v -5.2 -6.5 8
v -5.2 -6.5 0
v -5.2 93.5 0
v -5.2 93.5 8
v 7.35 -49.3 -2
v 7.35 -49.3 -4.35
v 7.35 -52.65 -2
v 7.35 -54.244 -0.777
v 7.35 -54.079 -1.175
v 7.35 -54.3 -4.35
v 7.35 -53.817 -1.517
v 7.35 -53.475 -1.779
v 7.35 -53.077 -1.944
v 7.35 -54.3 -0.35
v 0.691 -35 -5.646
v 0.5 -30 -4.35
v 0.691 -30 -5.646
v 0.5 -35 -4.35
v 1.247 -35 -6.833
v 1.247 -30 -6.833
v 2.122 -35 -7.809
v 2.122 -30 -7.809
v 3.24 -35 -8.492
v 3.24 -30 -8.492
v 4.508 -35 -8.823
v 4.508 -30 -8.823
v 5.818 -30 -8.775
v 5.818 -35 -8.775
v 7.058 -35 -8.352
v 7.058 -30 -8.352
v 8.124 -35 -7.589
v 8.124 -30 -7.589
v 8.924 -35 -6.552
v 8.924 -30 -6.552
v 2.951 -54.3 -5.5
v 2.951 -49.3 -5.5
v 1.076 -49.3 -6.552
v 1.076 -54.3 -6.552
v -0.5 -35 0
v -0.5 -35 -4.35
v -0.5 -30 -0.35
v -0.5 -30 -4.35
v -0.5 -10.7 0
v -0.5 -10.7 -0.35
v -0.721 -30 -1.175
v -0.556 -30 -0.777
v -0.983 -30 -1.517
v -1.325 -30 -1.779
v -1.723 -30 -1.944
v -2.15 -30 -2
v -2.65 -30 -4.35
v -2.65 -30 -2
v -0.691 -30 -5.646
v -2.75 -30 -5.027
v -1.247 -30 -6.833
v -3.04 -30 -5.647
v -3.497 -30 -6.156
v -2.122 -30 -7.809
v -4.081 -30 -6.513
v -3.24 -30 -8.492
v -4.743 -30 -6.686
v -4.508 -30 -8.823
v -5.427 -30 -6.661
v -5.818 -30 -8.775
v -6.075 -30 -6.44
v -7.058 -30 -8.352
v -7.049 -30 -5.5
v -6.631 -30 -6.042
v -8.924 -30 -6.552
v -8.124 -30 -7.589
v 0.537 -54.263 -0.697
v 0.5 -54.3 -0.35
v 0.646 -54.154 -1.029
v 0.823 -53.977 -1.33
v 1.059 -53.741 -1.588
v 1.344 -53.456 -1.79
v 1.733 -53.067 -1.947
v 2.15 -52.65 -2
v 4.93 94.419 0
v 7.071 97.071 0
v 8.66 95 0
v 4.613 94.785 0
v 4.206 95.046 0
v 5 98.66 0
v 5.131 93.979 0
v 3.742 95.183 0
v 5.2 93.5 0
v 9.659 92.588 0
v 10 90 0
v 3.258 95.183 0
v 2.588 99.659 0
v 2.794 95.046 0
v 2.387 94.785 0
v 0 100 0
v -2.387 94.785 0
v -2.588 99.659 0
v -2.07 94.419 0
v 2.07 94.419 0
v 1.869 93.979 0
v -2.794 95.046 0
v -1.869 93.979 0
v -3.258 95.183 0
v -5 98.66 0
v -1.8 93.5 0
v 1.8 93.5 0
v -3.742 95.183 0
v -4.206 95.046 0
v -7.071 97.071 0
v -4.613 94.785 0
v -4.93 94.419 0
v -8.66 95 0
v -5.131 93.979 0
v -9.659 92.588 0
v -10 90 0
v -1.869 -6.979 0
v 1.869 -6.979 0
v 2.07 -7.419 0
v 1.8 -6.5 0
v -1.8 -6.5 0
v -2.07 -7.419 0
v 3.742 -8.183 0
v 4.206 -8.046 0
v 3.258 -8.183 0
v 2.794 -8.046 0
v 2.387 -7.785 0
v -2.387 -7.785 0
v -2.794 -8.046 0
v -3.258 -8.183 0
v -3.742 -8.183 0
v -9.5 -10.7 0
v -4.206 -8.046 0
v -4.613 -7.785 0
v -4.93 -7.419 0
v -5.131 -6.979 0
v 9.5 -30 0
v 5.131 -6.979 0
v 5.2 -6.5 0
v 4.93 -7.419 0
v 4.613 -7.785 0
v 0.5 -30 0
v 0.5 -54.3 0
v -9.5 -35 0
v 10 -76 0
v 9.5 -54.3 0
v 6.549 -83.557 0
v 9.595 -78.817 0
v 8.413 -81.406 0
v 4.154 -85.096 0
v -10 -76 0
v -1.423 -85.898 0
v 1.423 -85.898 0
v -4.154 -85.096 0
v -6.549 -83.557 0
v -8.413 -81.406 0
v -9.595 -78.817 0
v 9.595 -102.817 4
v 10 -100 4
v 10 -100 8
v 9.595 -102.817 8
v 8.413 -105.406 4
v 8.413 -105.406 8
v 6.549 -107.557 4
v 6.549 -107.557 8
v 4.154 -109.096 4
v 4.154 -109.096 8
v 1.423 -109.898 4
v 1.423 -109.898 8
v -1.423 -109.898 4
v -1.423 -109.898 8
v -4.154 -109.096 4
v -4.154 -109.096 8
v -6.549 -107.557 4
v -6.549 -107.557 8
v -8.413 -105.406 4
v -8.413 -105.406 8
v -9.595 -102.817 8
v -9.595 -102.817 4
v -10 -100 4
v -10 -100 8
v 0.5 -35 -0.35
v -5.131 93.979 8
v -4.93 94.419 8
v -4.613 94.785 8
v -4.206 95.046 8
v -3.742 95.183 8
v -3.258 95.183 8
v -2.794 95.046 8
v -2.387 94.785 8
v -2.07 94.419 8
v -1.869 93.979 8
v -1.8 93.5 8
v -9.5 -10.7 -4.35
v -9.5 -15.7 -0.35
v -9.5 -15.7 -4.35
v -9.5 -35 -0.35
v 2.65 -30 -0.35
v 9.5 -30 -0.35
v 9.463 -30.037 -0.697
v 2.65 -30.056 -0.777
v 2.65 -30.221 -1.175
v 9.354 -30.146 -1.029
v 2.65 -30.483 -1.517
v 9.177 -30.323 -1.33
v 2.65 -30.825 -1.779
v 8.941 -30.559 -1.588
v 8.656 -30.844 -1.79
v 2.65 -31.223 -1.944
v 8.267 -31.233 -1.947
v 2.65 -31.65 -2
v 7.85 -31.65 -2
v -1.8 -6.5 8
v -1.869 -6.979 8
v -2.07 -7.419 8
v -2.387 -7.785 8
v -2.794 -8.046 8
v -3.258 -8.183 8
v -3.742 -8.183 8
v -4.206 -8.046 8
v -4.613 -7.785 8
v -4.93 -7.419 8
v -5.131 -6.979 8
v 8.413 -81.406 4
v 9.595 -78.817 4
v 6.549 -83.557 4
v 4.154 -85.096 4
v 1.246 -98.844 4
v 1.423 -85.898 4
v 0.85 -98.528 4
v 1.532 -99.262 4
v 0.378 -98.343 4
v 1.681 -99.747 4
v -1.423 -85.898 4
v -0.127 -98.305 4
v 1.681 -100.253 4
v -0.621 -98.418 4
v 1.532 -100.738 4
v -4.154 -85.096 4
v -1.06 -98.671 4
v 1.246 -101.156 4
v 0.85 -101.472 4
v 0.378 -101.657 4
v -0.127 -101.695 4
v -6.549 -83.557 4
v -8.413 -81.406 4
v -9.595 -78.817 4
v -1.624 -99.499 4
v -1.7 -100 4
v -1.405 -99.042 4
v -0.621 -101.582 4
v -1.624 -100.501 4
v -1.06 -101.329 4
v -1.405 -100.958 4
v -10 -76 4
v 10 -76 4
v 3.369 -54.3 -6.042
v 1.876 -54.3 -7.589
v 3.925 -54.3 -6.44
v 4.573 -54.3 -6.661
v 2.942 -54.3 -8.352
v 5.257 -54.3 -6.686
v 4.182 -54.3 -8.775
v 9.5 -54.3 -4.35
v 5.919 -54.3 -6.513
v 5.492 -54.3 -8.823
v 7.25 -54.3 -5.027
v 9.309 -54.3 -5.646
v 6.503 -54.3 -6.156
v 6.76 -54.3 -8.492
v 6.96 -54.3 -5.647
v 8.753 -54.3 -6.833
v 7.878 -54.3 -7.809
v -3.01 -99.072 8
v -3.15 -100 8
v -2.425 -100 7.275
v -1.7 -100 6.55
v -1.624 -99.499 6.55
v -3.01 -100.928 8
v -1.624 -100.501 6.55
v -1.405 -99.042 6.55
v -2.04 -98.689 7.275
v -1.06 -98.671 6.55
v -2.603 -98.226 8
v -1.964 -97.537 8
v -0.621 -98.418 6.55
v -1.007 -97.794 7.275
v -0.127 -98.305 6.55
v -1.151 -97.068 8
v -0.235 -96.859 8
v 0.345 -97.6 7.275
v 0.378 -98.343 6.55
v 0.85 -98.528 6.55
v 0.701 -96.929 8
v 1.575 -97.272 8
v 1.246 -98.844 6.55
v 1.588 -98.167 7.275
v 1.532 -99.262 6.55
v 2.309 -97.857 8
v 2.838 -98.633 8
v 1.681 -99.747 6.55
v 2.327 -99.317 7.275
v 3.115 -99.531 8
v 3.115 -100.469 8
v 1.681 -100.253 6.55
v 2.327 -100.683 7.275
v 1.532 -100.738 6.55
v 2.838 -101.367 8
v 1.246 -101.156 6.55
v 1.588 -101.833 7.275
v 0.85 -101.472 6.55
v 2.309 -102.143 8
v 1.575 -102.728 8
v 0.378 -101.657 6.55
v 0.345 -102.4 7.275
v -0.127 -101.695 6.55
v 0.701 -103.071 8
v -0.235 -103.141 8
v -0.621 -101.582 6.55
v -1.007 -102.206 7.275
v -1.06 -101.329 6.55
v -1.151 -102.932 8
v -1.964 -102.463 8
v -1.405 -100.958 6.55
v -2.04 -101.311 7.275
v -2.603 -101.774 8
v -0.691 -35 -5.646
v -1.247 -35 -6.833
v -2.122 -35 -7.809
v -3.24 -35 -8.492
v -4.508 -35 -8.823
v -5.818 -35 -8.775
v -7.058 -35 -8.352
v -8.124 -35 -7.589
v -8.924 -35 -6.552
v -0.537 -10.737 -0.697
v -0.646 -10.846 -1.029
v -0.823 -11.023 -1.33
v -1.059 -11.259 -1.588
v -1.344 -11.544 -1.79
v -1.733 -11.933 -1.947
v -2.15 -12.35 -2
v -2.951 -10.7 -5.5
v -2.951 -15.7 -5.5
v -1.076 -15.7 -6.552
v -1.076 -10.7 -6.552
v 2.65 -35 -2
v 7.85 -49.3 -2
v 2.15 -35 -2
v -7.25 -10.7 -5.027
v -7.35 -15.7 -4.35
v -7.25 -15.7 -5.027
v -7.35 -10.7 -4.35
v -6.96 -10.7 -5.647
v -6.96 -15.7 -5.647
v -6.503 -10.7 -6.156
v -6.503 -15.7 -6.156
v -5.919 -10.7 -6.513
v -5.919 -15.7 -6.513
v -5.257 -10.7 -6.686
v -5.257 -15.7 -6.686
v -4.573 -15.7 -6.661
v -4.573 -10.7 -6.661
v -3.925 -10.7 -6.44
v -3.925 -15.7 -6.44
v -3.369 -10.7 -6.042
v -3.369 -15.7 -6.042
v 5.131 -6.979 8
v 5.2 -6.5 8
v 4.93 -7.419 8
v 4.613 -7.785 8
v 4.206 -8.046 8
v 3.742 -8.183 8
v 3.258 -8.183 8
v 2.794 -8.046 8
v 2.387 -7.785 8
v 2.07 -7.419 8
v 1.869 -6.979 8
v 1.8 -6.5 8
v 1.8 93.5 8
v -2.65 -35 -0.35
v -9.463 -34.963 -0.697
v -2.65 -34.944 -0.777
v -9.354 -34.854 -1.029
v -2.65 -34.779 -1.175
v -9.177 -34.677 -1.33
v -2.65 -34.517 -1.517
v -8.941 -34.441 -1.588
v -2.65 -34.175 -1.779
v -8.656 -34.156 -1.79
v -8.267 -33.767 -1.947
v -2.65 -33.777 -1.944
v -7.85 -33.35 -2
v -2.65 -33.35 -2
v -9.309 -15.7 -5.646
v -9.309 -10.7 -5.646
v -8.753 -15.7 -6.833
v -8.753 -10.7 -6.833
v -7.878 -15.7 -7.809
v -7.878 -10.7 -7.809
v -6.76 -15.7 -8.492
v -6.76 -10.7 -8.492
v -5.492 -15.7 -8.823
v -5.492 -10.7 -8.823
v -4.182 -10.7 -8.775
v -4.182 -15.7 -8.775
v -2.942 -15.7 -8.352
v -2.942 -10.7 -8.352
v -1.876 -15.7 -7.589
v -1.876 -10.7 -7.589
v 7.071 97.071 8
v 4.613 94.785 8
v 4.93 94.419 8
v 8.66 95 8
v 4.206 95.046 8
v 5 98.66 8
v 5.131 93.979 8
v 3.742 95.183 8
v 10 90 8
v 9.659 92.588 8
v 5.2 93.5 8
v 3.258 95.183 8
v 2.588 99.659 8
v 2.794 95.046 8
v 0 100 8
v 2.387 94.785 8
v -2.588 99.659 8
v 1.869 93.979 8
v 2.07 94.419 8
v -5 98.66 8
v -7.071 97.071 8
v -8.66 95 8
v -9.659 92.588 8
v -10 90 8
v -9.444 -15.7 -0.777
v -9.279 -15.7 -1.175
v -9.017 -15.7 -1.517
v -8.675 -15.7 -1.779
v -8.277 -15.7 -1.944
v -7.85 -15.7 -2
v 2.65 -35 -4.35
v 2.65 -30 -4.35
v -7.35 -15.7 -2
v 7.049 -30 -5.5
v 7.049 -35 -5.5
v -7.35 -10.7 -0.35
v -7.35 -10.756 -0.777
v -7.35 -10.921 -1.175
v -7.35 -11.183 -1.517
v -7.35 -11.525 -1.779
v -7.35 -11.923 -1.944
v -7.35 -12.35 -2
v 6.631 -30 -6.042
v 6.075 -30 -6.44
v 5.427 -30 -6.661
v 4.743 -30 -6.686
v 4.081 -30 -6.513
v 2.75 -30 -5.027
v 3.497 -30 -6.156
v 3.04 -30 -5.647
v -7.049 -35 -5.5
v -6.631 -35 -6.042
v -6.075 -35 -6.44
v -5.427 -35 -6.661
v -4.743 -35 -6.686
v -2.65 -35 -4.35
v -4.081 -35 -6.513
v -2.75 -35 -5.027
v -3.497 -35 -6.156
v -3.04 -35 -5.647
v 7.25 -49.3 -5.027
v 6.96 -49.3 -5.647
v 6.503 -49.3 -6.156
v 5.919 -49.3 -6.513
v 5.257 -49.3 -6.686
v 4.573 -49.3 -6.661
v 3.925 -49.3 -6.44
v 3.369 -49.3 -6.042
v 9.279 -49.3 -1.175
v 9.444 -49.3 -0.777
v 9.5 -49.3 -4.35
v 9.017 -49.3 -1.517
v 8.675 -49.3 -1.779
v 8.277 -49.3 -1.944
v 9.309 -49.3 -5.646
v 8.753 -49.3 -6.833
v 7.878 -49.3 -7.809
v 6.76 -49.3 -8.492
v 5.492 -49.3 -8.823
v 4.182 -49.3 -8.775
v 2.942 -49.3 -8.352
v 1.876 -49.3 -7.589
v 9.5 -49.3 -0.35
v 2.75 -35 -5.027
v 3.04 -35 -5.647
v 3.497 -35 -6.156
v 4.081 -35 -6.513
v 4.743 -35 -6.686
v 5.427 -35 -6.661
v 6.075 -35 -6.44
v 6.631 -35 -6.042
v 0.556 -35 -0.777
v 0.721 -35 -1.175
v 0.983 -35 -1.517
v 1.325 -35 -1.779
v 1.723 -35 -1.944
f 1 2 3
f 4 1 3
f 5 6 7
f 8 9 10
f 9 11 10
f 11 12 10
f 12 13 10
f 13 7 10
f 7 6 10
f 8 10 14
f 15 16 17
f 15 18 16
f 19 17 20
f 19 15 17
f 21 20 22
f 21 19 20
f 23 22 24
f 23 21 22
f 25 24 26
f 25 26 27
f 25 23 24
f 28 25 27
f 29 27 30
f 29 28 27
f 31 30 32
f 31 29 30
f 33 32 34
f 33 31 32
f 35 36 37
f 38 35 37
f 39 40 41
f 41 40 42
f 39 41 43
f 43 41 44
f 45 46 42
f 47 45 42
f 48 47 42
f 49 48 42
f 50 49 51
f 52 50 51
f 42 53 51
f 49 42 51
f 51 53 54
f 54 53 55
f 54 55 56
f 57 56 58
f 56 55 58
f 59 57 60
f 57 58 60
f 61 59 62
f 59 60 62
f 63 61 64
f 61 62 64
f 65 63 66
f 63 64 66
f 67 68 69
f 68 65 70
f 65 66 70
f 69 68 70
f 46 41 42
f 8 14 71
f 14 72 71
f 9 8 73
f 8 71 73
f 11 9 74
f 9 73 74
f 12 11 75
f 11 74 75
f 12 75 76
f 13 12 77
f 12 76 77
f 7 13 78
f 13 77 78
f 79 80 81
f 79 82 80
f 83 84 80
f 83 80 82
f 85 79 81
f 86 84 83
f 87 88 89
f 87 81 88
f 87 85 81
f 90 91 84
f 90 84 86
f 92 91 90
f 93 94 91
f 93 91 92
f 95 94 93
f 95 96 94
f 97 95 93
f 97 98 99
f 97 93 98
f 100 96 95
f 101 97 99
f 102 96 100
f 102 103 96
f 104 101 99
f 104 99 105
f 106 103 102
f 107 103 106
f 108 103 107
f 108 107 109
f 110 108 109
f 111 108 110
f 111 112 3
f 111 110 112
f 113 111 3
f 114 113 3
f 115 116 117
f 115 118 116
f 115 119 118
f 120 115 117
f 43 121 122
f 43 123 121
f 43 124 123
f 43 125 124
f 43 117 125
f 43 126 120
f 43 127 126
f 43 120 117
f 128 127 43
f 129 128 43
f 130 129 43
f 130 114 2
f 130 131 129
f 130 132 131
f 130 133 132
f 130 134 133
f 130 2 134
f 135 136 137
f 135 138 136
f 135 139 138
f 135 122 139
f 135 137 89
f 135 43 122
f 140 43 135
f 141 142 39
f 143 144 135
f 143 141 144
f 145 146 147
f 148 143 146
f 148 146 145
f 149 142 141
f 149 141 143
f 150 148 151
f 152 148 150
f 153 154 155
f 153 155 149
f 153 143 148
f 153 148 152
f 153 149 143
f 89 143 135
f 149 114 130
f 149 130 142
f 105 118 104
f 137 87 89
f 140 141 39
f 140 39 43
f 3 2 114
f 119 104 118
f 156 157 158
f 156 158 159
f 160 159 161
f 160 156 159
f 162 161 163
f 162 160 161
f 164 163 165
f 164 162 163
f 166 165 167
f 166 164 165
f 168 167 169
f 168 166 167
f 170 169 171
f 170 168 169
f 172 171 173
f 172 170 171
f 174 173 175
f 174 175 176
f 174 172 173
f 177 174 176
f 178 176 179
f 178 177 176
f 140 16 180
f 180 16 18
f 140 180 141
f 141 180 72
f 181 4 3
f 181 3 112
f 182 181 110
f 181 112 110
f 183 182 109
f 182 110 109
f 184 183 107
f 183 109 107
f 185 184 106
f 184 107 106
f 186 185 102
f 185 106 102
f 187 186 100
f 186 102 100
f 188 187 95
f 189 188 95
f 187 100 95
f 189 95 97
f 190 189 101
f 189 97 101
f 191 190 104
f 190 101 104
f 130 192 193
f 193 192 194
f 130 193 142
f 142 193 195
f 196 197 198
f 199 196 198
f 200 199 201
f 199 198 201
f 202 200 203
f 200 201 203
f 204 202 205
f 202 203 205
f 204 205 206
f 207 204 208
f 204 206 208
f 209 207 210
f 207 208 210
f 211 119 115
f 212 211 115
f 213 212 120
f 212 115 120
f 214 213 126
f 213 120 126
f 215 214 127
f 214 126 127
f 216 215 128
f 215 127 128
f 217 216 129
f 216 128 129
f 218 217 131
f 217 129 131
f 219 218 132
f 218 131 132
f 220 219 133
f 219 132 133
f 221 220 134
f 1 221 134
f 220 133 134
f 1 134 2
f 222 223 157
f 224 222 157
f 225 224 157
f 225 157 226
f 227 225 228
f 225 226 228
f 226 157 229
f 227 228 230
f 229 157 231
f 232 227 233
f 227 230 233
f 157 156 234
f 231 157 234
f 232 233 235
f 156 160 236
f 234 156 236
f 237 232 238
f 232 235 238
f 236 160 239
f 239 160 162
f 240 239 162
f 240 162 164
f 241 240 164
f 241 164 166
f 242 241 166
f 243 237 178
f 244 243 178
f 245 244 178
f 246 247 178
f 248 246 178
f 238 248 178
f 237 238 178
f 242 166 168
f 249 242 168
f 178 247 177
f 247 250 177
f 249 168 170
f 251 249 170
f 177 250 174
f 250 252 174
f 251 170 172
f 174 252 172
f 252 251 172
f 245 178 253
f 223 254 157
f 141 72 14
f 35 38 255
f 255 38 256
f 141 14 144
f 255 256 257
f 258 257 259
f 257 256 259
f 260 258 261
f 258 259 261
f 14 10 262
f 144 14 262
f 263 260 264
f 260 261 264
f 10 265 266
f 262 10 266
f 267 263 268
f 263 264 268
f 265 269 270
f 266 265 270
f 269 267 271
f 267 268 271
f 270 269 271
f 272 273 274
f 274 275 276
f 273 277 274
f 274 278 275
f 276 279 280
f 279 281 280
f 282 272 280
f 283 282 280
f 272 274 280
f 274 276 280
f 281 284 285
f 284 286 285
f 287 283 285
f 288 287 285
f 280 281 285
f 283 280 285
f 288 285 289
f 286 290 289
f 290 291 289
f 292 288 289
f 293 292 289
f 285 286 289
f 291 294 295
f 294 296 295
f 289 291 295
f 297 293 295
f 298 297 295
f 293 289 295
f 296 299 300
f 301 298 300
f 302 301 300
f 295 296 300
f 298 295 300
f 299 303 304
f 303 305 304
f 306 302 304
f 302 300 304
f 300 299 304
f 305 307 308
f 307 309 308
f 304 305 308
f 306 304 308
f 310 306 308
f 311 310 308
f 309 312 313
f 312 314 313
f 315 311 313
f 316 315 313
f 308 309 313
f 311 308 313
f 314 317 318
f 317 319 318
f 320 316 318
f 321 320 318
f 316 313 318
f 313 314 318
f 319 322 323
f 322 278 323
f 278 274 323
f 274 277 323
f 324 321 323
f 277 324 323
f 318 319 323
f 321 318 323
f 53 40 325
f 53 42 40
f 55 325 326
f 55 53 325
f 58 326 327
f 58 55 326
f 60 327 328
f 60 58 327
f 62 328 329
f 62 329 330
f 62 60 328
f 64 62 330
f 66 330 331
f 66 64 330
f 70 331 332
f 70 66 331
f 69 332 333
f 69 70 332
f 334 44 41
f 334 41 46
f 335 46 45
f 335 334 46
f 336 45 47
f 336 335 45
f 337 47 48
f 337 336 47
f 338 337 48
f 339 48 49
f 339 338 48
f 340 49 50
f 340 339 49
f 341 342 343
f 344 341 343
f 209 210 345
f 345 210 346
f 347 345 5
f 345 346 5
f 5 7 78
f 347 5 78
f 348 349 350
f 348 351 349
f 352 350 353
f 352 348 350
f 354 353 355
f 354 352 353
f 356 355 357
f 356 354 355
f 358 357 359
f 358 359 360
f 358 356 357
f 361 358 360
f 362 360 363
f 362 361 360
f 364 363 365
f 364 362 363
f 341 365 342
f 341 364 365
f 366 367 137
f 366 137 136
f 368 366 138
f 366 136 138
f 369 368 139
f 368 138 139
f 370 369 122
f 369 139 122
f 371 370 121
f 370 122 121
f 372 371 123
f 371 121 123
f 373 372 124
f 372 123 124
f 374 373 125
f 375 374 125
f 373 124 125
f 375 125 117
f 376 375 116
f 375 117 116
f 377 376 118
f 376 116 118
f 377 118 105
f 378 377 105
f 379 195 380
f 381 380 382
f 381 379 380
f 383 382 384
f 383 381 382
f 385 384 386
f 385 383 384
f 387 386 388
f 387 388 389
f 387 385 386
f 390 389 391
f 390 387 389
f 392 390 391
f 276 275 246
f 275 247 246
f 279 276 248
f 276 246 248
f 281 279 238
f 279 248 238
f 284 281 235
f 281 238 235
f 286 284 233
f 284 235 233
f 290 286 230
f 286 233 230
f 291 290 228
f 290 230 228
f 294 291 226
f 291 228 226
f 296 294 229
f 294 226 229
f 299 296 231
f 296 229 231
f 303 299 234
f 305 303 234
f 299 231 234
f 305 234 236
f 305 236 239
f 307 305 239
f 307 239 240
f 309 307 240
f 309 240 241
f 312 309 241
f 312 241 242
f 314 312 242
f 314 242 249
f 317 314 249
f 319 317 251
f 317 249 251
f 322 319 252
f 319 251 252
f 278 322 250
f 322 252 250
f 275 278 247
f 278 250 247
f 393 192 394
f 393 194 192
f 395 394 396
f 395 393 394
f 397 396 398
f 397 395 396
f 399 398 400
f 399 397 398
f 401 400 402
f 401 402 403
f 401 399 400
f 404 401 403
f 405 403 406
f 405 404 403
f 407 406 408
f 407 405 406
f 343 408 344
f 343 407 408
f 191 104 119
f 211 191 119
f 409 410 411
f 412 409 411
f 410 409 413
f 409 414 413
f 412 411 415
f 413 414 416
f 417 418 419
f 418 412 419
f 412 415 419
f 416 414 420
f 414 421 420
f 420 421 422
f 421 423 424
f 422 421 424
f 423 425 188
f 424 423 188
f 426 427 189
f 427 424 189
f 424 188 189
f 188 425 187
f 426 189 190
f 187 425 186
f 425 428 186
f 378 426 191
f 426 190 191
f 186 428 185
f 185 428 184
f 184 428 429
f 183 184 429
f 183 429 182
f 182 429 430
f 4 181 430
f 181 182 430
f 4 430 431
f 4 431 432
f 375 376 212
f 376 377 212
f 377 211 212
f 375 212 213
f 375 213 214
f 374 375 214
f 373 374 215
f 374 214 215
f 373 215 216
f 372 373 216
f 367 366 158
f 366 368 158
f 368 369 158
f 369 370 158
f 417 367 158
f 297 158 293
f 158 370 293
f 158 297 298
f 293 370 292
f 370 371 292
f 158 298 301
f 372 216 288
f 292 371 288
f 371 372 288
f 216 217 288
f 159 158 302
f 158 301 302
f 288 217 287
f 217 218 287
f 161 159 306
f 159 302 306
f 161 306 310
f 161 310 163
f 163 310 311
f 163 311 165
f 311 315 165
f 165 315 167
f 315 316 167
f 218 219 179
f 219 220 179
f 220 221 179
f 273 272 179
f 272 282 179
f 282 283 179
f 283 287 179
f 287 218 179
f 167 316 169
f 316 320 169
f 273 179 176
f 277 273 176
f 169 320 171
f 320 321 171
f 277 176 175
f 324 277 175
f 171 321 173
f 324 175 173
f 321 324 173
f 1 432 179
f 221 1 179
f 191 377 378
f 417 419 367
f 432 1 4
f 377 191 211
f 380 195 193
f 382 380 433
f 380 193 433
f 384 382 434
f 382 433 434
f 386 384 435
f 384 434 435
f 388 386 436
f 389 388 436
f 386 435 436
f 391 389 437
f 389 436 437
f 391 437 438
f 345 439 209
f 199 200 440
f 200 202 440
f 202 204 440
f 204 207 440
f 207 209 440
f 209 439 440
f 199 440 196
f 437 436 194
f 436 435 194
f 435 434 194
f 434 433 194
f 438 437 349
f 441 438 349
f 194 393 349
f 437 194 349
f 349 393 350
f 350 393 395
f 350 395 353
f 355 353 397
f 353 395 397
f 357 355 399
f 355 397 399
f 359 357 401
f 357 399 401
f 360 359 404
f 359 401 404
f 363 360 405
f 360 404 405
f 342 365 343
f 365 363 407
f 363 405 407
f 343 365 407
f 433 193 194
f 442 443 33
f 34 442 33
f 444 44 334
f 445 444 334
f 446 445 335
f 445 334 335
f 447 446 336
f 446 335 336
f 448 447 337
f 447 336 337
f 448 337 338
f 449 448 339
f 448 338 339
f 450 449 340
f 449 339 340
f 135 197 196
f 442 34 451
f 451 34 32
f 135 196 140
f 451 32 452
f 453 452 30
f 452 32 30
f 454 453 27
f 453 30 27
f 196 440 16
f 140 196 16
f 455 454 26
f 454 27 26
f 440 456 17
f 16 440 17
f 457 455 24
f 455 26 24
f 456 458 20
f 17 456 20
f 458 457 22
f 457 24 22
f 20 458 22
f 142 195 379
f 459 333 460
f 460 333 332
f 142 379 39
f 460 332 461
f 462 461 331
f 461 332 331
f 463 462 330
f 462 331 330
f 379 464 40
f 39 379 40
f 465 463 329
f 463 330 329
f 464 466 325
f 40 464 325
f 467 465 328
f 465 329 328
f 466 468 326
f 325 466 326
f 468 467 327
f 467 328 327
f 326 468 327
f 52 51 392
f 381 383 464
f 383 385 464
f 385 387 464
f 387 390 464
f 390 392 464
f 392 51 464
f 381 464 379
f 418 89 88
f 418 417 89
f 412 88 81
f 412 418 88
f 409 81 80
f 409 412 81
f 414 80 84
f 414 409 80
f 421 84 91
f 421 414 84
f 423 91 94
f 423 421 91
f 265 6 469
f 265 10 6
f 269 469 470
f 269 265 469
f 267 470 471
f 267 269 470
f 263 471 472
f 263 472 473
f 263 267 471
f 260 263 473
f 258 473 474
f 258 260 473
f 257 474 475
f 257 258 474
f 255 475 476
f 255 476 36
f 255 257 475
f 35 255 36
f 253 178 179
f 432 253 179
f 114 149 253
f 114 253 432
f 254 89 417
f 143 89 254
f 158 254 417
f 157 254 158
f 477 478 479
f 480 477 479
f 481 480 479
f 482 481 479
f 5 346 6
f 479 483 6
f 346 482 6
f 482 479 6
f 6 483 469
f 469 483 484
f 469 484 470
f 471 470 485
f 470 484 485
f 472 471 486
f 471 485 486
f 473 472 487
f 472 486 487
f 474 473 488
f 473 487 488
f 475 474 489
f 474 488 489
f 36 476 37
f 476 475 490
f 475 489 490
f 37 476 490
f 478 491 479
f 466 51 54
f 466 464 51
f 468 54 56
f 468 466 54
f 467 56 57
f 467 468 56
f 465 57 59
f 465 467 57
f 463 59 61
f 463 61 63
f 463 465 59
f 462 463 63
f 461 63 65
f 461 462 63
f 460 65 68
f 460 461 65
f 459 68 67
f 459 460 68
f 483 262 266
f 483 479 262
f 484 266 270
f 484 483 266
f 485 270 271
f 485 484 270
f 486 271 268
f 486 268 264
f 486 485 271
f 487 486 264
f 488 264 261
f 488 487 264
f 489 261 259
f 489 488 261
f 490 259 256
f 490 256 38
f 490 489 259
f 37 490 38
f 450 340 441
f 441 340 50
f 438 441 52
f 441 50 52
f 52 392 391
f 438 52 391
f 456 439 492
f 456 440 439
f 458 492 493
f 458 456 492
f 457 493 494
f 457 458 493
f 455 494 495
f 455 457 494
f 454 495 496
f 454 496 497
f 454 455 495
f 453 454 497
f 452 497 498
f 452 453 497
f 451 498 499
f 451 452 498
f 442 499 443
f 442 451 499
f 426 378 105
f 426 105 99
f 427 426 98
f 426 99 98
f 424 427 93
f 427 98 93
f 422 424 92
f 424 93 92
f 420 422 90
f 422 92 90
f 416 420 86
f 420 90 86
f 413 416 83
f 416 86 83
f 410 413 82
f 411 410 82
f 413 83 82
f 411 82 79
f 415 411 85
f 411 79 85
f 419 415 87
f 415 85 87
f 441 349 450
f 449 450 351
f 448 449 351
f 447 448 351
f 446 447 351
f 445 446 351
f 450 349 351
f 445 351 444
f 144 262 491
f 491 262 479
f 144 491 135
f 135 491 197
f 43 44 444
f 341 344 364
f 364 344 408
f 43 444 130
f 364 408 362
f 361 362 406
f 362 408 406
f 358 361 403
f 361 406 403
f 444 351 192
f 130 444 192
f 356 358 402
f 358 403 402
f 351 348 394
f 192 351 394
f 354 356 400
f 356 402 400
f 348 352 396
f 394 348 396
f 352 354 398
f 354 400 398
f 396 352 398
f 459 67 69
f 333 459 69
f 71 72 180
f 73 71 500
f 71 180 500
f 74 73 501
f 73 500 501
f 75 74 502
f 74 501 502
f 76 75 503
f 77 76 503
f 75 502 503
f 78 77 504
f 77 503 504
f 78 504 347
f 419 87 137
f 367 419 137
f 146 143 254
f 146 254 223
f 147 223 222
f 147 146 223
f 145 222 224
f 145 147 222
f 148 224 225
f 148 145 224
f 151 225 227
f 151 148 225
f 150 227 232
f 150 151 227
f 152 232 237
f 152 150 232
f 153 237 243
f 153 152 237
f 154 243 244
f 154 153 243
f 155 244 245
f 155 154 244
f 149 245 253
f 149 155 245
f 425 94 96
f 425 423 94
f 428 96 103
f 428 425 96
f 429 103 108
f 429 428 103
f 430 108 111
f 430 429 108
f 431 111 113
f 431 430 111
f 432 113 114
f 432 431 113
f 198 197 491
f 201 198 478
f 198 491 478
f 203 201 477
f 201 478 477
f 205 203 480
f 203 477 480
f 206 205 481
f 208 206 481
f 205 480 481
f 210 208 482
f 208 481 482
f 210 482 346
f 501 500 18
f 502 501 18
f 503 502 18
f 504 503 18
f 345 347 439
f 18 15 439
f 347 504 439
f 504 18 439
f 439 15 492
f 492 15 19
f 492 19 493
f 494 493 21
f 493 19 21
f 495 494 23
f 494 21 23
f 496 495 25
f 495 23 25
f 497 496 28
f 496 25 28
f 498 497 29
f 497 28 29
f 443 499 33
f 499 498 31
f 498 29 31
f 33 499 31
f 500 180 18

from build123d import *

# Parameters (mm, degrees)
BOSS_EXTRUDE1_DEPTH                                 = 8
FILLET1_R                                           = 10
CUT_EXTRUDE8_DEPTH                                  = 4
CSK_FOR_M3_COUNTERSUNK_FLAT_HEAD_SCREW2_D           = 3.4
CSK_FOR_M3_COUNTERSUNK_FLAT_HEAD_SCREW2_DEPTH       = 8.5
CSK_FOR_M3_COUNTERSUNK_FLAT_HEAD_SCREW2_CSINK_D     = 6.3
CSK_FOR_M3_COUNTERSUNK_FLAT_HEAD_SCREW2_CSINK_ANGLE = 90
CSK_FOR_M3_COUNTERSUNK_FLAT_HEAD_SCREW2_TIP         = 1.021463052
SKETCH14_W                                          = 9
SKETCH14_H                                          = 24.3
BOSS_EXTRUDE2_DEPTH                                 = 2
FILLET3_R                                           = 1.65
BOSS_EXTRUDE3_REACH                                 = 112.905
SKETCH16_W                                          = 2.15
SKETCH16_H                                          = 5
SKETCH18_W                                          = 2.15
SKETCH18_H                                          = 5
CIRPATTERN1_COUNT                                   = 2
CIRPATTERN2_COUNT                                   = 2
CIRPATTERN2_COPY_1_REACH                            = 112.905
CIRPATTERN2_COPY_1_SKETCH_W                         = 2.15
CIRPATTERN2_COPY_1_SKETCH_H                         = 5
CIRPATTERN2_COPY_2_SKETCH_W                         = 2.15
CIRPATTERN2_COPY_2_SKETCH_H                         = 5
FILLET3_OF_CIRPATTERN2_R                            = 1.65


with BuildPart() as part:
    # Sketch1 → Boss-Extrude1 (new body)
    with BuildSketch(Plane(origin=(0, 0, 0), x_dir=(0, 1, 0), z_dir=(0, 0, 1))):
        with BuildLine():
            Line((100, -10), (-100, -10))
            ThreePointArc((-100, -10), (-110, 0), (-100, 10))
            Line((-100, 10), (100, 10))
            Line((100, 10), (100, -10))
        make_face()
        with BuildLine():
            Line((-6.5, 5.2), (93.5, 5.2))
            ThreePointArc((93.5, 5.2), (95.2, 3.5), (93.5, 1.8))
            Line((93.5, 1.8), (-6.5, 1.8))
            ThreePointArc((-6.5, 1.8), (-8.2, 3.5), (-6.5, 5.2))
        make_face(mode=Mode.SUBTRACT)
        with BuildLine():
            Line((-6.5, -1.8), (93.5, -1.8))
            ThreePointArc((93.5, -1.8), (95.2, -3.5), (93.5, -5.2))
            Line((93.5, -5.2), (-6.5, -5.2))
            ThreePointArc((-6.5, -5.2), (-8.2, -3.5), (-6.5, -1.8))
        make_face(mode=Mode.SUBTRACT)
    extrude(amount=BOSS_EXTRUDE1_DEPTH)

    # Fillet1
    fillet1_edges = [part.edges().sort_by_distance(p)[0] for p in [
        (-10, 100, 4),
        (10, 100, 4),
    ]]
    fillet(fillet1_edges, radius=FILLET1_R - 0.0001)  # a hair under: the kernel refuses the full size

    # Sketch8 → Cut-Extrude8 (cut)
    with BuildSketch(Plane(origin=(0, 0, 0), x_dir=(1, 0, 0), z_dir=(0, 0, -1))):
        with BuildLine():
            Line((-10, 76), (-10, 110))
            Line((-10, 110), (10, 110))
            Line((10, 110), (10, 76))
            ThreePointArc((10, 76), (0, 86), (-10, 76))
        make_face()
    extrude(amount=-CUT_EXTRUDE8_DEPTH, mode=Mode.SUBTRACT)

    # CSK for M3 Countersunk Flat Head Screw2
    with Locations(Plane.XY.offset(8)):
        with Locations((0, -100)):
            CounterSinkHole(CSK_FOR_M3_COUNTERSUNK_FLAT_HEAD_SCREW2_D / 2, CSK_FOR_M3_COUNTERSUNK_FLAT_HEAD_SCREW2_CSINK_D / 2, depth=CSK_FOR_M3_COUNTERSUNK_FLAT_HEAD_SCREW2_DEPTH, counter_sink_angle=CSK_FOR_M3_COUNTERSUNK_FLAT_HEAD_SCREW2_CSINK_ANGLE)
            with Locations((0, 0, -(CSK_FOR_M3_COUNTERSUNK_FLAT_HEAD_SCREW2_DEPTH + CSK_FOR_M3_COUNTERSUNK_FLAT_HEAD_SCREW2_TIP / 2))):  # 118° drill point
                Cone(0, CSK_FOR_M3_COUNTERSUNK_FLAT_HEAD_SCREW2_D / 2, CSK_FOR_M3_COUNTERSUNK_FLAT_HEAD_SCREW2_TIP, mode=Mode.SUBTRACT)

    # Sketch14 → Boss-Extrude2 (add)
    with BuildSketch(Plane.XY):
        with Locations((-5, -22.85)):
            Rectangle(SKETCH14_W, SKETCH14_H)
    boss_extrude2 = extrude(amount=-BOSS_EXTRUDE2_DEPTH)

    # Fillet3
    fillet3_edges = [part.edges().sort_by_distance(p)[0] for p in [
        (-5, -35, -2),
        (-9.5, -22.85, -2),
        (-5, -10.7, -2),
        (-0.5, -22.85, -2),
    ]]
    fillet(fillet3_edges, radius=FILLET3_R)

    # Boss-Extrude3: up to this face of the body (flat: up to its plane)
    boss_extrude3_end = Plane(part.part.faces().sort_by_distance((0.402421267, 0.024510411, 0))[0])
    # Sketch16 → Boss-Extrude3 (add, up to the picked face)
    with BuildSketch(Plane.XY.offset(-2), mode=Mode.PRIVATE) as boss_extrude3_sk1:
        with Locations((-1.575, -32.5)):
            Rectangle(SKETCH16_W, SKETCH16_H)
    boss_extrude3_tool1 = split(extrude(boss_extrude3_sk1.sketch, amount=BOSS_EXTRUDE3_REACH, mode=Mode.PRIVATE), bisect_by=boss_extrude3_end, keep=Keep.BOTH, mode=Mode.PRIVATE)
    boss_extrude3 = boss_extrude3_tool1.solids().sort_by(Axis((-1.575, -32.5, -2), (0, 0, 1)))[0]
    add(boss_extrude3)

    # Sweep3: sweep along a path in Sketch17
    with BuildLine(Plane(origin=(0, -33.35, 0), x_dir=(-1, 0, 0), z_dir=(0, -1, 0))) as sweep3_path:
        Line((2.65, 2), (2.65, 4.35))
        ThreePointArc((2.65, 4.35), (4.405679741, 6.623605821), (7.049390153, 5.5))
    # Sketch18 → Sweep3 (sweep)
    with BuildSketch(Plane.XY.offset(-2)):
        with Locations((-1.575, -32.5)):
            Rectangle(SKETCH18_W, SKETCH18_H)
    sweep3 = sweep(path=sweep3_path.line)

    # CirPattern1: Boss-Extrude3, Sweep3 ×2 about axis
    cirpattern1_axis = Axis((-5, -22.85, 0), (0, 0, 1))
    add([boss_extrude3.rotate(cirpattern1_axis, i * 360 / CIRPATTERN1_COUNT) for i in range(1, CIRPATTERN1_COUNT)])
    add([sweep3.rotate(cirpattern1_axis, i * 360 / CIRPATTERN1_COUNT) for i in range(1, CIRPATTERN1_COUNT)])

    # CirPattern2: Boss-Extrude2, Boss-Extrude3, Sweep3 ×2 about axis
    cirpattern2_axis = Axis((0, -32.5, 0), (0, 0, 1))
    add([boss_extrude2.rotate(cirpattern2_axis, i * 360 / CIRPATTERN2_COUNT) for i in range(1, CIRPATTERN2_COUNT)])
    add([boss_extrude3.rotate(cirpattern2_axis, i * 360 / CIRPATTERN2_COUNT) for i in range(1, CIRPATTERN2_COUNT)])
    add([sweep3.rotate(cirpattern2_axis, i * 360 / CIRPATTERN2_COUNT) for i in range(1, CIRPATTERN2_COUNT)])

    # CirPattern2 copy 1: up to this face of the body (flat: up to its plane)
    cirpattern2_copy_1_end = Plane(part.part.faces().sort_by_distance((10.402421267, -19.275489589, 0))[0])
    # CirPattern2 copy 1 sketch → CirPattern2 copy 1 (add, up to the picked face)
    with BuildSketch(Plane(origin=(10, -19.3, -2), x_dir=(1, 0, 0), z_dir=(0, 0, 1)), mode=Mode.PRIVATE) as cirpattern2_copy_1_sk1:
        with Locations((-1.575, -32.5)):
            Rectangle(CIRPATTERN2_COPY_1_SKETCH_W, CIRPATTERN2_COPY_1_SKETCH_H)
    cirpattern2_copy_1_tool1 = split(extrude(cirpattern2_copy_1_sk1.sketch, amount=CIRPATTERN2_COPY_1_REACH, mode=Mode.PRIVATE), bisect_by=cirpattern2_copy_1_end, keep=Keep.BOTH, mode=Mode.PRIVATE)
    add(cirpattern2_copy_1_tool1.solids().sort_by(Axis((8.425, -51.8, -2), (0, 0, 1)))[0])

    # CirPattern2 copy 2: sweep along a path in CirPattern2 copy 2 path
    with BuildLine(Plane(origin=(10, -52.65, 0), x_dir=(-1, 0, 0), z_dir=(0, -1, 0))) as cirpattern2_copy_2_path:
        Line((2.65, 2), (2.65, 4.35))
        ThreePointArc((2.65, 4.35), (4.405679741, 6.623605821), (7.049390153, 5.5))
    # CirPattern2 copy 2 sketch → CirPattern2 copy 2 (sweep)
    with BuildSketch(Plane(origin=(10, -19.3, -2), x_dir=(1, 0, 0), z_dir=(0, 0, 1))):
        with Locations((-1.575, -32.5)):
            Rectangle(CIRPATTERN2_COPY_2_SKETCH_W, CIRPATTERN2_COPY_2_SKETCH_H)
    sweep(path=cirpattern2_copy_2_path.line)

    # Fillet3 of CirPattern2
    fillet3_of_cirpattern2_edges = [part.edges().sort_by_distance(p)[0] for p in [
        (5, -30, -2),
        (9.5, -42.15, -2),
        (5, -54.3, -2),
        (0.5, -42.15, -2),
    ]]
    fillet(fillet3_of_cirpattern2_edges, radius=FILLET3_OF_CIRPATTERN2_R)


solid = part.part
